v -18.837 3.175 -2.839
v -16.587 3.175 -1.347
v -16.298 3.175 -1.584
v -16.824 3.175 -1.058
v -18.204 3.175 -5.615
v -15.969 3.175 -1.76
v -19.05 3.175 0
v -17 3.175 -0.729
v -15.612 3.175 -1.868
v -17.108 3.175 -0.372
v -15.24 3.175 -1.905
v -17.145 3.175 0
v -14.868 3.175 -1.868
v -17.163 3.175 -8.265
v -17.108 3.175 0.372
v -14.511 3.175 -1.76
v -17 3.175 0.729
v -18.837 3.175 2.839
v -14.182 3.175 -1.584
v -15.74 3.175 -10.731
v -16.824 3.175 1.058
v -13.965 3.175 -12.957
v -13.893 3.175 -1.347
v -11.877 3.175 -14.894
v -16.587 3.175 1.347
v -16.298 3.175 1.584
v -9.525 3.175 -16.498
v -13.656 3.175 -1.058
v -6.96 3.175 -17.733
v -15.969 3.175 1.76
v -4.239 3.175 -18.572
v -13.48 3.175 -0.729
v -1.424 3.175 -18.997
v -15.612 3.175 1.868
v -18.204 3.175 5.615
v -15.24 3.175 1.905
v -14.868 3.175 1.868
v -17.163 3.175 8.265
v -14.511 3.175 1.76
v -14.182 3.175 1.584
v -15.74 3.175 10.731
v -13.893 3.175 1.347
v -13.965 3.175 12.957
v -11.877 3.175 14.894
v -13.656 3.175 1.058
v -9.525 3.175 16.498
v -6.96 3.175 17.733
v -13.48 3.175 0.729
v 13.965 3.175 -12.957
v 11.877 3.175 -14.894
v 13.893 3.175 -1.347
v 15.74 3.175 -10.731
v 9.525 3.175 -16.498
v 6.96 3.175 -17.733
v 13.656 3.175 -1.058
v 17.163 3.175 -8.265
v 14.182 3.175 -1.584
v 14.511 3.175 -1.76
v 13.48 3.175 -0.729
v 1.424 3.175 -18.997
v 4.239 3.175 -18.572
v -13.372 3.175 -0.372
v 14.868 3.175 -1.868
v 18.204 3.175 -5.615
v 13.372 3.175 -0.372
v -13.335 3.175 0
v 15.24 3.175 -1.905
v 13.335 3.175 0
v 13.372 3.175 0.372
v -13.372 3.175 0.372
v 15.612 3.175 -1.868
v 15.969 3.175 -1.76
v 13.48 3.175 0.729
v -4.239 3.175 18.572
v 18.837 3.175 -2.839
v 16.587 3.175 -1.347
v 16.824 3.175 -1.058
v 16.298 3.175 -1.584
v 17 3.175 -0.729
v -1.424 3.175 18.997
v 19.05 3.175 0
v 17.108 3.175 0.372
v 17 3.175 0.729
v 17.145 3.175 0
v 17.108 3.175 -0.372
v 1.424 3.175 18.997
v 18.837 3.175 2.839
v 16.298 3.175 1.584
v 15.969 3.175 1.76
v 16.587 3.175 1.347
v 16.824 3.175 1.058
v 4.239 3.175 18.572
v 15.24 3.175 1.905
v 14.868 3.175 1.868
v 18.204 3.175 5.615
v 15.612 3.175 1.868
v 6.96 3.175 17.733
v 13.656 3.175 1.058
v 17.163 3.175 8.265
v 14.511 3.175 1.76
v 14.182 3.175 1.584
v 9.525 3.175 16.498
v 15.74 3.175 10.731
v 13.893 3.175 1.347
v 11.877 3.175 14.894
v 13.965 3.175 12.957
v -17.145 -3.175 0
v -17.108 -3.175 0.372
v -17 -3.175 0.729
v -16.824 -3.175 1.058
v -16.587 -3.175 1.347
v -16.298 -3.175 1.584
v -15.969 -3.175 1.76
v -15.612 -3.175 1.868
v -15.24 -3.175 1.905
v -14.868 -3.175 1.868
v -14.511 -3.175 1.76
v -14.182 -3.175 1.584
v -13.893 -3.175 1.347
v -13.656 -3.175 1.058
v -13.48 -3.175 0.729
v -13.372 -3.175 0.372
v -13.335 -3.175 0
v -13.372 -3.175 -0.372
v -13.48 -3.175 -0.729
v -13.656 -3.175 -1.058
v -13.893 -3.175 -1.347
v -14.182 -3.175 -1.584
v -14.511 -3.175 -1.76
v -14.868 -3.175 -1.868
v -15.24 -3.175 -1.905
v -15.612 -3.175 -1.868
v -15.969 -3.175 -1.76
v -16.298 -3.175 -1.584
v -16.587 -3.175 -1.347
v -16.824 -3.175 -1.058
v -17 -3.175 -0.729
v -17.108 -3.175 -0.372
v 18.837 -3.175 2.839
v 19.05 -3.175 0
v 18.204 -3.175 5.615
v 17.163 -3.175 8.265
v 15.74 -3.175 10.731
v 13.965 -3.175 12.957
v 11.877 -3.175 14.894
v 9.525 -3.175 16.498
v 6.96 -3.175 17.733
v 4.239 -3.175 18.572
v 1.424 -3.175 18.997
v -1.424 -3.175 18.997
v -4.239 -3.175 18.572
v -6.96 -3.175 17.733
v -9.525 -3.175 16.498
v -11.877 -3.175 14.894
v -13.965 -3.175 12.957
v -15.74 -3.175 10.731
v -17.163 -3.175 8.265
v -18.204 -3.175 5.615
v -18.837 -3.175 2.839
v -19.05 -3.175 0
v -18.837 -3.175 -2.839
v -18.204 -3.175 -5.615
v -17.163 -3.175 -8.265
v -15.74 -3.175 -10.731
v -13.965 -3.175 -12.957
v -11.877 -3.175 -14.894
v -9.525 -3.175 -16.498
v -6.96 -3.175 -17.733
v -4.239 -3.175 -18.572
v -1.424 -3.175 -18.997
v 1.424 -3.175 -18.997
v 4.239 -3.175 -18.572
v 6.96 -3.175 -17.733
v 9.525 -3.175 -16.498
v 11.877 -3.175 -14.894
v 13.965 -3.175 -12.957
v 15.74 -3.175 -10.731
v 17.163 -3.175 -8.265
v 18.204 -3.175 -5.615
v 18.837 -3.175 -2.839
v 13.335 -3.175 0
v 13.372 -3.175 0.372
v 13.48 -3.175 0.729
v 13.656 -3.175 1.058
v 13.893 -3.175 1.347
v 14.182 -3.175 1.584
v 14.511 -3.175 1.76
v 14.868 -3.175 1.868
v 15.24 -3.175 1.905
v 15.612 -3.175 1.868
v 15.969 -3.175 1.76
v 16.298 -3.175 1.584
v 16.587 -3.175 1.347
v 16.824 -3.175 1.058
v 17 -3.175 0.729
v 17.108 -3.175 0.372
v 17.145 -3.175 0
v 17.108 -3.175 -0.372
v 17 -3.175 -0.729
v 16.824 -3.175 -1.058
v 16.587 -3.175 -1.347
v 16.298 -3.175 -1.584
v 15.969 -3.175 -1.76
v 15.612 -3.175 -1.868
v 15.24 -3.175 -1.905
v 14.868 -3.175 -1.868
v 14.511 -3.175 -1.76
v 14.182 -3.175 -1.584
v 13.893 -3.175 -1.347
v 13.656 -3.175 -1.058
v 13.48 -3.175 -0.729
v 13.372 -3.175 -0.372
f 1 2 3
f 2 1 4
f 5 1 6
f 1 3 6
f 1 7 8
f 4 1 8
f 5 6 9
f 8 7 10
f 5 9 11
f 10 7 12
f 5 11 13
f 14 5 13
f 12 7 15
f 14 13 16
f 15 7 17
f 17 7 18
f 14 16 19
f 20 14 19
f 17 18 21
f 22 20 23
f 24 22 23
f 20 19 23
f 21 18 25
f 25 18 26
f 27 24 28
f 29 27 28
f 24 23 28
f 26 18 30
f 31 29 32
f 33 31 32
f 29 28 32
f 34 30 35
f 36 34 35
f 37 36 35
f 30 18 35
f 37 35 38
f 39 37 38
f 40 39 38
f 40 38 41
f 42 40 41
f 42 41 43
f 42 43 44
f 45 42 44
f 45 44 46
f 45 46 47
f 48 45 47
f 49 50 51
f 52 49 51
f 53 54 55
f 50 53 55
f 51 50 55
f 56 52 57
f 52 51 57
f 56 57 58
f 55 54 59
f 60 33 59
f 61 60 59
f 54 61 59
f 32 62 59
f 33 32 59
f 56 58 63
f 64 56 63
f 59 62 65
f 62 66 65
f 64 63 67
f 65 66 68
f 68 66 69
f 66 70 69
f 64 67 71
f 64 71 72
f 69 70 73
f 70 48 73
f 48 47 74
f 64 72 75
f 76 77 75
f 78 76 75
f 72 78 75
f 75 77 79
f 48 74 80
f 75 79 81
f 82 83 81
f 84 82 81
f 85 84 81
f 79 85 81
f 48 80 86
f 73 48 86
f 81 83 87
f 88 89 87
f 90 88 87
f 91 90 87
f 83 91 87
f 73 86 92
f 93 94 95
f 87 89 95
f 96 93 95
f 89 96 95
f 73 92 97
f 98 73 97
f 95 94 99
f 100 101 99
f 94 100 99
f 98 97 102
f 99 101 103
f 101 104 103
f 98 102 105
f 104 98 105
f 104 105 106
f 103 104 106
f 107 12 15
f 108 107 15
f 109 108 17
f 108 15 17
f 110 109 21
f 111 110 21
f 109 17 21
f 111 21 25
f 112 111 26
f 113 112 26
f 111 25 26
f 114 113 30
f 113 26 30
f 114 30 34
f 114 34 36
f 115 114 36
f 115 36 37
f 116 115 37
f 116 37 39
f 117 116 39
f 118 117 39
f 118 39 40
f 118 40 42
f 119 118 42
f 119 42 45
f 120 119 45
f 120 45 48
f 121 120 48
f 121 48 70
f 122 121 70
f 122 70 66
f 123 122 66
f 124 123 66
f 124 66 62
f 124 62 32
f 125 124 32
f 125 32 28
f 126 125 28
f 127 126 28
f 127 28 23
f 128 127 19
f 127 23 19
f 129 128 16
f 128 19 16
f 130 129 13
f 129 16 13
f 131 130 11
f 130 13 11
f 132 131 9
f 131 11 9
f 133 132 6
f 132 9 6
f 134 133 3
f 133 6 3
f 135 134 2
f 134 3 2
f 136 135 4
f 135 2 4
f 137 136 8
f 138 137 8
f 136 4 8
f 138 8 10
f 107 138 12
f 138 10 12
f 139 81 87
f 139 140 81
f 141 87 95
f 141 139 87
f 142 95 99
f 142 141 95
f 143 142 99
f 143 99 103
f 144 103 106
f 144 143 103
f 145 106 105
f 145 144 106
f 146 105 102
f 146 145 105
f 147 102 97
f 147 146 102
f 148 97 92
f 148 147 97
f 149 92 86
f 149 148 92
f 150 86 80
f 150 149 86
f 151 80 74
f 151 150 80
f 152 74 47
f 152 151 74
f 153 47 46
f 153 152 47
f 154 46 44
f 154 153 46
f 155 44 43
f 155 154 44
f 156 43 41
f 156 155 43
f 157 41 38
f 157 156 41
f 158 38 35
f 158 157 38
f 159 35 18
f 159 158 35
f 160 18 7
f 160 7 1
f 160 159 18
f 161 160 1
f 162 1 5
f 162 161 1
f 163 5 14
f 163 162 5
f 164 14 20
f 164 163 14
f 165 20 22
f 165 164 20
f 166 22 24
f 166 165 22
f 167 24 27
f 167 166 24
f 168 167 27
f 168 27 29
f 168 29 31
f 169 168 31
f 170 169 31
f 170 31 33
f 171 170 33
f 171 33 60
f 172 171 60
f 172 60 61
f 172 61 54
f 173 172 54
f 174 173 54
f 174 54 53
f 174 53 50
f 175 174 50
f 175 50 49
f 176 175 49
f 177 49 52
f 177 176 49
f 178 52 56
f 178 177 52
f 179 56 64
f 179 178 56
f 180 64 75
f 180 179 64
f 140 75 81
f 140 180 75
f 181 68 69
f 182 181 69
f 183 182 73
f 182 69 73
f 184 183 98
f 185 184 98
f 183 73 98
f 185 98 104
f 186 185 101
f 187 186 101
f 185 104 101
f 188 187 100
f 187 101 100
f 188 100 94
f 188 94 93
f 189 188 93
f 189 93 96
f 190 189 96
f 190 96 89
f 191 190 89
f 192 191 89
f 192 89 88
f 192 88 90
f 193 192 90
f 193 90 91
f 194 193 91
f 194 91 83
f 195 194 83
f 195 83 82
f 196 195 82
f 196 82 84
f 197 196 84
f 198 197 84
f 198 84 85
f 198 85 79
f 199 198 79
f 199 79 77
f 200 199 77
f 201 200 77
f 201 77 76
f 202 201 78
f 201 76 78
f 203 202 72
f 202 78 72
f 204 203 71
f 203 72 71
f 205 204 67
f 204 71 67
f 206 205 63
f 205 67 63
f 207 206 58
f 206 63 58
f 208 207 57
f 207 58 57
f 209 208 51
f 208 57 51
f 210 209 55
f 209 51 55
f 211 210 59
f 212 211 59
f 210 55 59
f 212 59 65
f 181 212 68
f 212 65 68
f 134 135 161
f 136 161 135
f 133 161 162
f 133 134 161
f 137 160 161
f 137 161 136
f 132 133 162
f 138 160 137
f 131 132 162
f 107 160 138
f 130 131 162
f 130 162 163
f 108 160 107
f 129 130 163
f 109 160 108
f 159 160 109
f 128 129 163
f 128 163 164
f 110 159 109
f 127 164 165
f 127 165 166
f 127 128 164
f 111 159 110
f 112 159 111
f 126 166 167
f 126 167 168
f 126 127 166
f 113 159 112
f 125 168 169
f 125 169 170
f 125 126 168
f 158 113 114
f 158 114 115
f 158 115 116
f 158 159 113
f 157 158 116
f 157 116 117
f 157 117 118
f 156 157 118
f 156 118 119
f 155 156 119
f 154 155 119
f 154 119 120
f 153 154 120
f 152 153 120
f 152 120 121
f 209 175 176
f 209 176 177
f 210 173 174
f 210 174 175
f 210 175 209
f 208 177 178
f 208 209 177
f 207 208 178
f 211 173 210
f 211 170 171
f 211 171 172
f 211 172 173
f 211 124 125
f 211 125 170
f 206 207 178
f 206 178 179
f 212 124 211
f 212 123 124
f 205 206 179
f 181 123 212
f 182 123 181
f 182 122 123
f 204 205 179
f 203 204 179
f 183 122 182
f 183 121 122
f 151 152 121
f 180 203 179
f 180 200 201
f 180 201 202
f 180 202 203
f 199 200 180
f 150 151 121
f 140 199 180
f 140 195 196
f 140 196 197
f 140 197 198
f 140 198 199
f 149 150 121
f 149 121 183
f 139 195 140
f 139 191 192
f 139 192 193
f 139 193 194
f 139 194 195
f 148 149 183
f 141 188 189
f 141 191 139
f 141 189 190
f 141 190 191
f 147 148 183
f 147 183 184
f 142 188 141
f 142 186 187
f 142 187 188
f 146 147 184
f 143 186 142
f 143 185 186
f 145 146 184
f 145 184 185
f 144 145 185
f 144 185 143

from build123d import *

# Parameters (mm, degrees)
F0_R     = 19.05
F1_DEPTH = 3.175
F2_D     = 3.81
F3_D     = 3.81


with BuildPart() as f1:
    # F0 (on Front) → F1 (new body, symmetric)
    with BuildSketch(Plane.XZ):
        Circle(F0_R)
    extrude(amount=F1_DEPTH, both=True)

    # F2 (through all)
    with Locations(Plane.XZ):
        with Locations((15.24, 0), (-15.24, 0)):
            Hole(F2_D / 2)

    # F3 (through all)
    with Locations(Plane(origin=(0, 0, 0), x_dir=(1, 0, 0), z_dir=(0, 1, 0))):
        with Locations((-15.24, 0), (15.24, 0)):
            Hole(F3_D / 2)


solid = f1.part
